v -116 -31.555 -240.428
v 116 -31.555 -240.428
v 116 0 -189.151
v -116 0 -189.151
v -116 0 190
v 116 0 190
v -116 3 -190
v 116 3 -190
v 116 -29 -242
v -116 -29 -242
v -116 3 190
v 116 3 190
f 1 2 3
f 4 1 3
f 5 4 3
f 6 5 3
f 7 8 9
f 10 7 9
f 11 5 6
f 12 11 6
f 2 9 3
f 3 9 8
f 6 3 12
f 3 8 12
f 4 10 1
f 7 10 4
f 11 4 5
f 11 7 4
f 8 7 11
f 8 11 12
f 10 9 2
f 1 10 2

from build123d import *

# Parameters (mm, degrees)
SKETCH1_W           = 232
SKETCH1_H           = 380
BOSS_EXTRUDE1_DEPTH = 3
EXTRUDE_THIN1_DEPTH = 232


with BuildPart() as part:
    # Sketch1 → Boss-Extrude1 (new body)
    with BuildSketch(Plane(origin=(0, 0, 0), x_dir=(1, 0, 0), z_dir=(0, 1, 0))):
        Rectangle(SKETCH1_W, SKETCH1_H)
    extrude(amount=BOSS_EXTRUDE1_DEPTH)

    # Sketch5 → Extrude-Thin1 (add)
    with BuildSketch(Plane(origin=(116, 0, 0), x_dir=(0, 0, -1), z_dir=(1, 0, 0))):
        Polygon((190, 3), (242, -29), (240.427707723, -31.55497495), (188.427707723, 0.44502505), align=None)
    extrude(amount=-EXTRUDE_THIN1_DEPTH)


solid = part.part
